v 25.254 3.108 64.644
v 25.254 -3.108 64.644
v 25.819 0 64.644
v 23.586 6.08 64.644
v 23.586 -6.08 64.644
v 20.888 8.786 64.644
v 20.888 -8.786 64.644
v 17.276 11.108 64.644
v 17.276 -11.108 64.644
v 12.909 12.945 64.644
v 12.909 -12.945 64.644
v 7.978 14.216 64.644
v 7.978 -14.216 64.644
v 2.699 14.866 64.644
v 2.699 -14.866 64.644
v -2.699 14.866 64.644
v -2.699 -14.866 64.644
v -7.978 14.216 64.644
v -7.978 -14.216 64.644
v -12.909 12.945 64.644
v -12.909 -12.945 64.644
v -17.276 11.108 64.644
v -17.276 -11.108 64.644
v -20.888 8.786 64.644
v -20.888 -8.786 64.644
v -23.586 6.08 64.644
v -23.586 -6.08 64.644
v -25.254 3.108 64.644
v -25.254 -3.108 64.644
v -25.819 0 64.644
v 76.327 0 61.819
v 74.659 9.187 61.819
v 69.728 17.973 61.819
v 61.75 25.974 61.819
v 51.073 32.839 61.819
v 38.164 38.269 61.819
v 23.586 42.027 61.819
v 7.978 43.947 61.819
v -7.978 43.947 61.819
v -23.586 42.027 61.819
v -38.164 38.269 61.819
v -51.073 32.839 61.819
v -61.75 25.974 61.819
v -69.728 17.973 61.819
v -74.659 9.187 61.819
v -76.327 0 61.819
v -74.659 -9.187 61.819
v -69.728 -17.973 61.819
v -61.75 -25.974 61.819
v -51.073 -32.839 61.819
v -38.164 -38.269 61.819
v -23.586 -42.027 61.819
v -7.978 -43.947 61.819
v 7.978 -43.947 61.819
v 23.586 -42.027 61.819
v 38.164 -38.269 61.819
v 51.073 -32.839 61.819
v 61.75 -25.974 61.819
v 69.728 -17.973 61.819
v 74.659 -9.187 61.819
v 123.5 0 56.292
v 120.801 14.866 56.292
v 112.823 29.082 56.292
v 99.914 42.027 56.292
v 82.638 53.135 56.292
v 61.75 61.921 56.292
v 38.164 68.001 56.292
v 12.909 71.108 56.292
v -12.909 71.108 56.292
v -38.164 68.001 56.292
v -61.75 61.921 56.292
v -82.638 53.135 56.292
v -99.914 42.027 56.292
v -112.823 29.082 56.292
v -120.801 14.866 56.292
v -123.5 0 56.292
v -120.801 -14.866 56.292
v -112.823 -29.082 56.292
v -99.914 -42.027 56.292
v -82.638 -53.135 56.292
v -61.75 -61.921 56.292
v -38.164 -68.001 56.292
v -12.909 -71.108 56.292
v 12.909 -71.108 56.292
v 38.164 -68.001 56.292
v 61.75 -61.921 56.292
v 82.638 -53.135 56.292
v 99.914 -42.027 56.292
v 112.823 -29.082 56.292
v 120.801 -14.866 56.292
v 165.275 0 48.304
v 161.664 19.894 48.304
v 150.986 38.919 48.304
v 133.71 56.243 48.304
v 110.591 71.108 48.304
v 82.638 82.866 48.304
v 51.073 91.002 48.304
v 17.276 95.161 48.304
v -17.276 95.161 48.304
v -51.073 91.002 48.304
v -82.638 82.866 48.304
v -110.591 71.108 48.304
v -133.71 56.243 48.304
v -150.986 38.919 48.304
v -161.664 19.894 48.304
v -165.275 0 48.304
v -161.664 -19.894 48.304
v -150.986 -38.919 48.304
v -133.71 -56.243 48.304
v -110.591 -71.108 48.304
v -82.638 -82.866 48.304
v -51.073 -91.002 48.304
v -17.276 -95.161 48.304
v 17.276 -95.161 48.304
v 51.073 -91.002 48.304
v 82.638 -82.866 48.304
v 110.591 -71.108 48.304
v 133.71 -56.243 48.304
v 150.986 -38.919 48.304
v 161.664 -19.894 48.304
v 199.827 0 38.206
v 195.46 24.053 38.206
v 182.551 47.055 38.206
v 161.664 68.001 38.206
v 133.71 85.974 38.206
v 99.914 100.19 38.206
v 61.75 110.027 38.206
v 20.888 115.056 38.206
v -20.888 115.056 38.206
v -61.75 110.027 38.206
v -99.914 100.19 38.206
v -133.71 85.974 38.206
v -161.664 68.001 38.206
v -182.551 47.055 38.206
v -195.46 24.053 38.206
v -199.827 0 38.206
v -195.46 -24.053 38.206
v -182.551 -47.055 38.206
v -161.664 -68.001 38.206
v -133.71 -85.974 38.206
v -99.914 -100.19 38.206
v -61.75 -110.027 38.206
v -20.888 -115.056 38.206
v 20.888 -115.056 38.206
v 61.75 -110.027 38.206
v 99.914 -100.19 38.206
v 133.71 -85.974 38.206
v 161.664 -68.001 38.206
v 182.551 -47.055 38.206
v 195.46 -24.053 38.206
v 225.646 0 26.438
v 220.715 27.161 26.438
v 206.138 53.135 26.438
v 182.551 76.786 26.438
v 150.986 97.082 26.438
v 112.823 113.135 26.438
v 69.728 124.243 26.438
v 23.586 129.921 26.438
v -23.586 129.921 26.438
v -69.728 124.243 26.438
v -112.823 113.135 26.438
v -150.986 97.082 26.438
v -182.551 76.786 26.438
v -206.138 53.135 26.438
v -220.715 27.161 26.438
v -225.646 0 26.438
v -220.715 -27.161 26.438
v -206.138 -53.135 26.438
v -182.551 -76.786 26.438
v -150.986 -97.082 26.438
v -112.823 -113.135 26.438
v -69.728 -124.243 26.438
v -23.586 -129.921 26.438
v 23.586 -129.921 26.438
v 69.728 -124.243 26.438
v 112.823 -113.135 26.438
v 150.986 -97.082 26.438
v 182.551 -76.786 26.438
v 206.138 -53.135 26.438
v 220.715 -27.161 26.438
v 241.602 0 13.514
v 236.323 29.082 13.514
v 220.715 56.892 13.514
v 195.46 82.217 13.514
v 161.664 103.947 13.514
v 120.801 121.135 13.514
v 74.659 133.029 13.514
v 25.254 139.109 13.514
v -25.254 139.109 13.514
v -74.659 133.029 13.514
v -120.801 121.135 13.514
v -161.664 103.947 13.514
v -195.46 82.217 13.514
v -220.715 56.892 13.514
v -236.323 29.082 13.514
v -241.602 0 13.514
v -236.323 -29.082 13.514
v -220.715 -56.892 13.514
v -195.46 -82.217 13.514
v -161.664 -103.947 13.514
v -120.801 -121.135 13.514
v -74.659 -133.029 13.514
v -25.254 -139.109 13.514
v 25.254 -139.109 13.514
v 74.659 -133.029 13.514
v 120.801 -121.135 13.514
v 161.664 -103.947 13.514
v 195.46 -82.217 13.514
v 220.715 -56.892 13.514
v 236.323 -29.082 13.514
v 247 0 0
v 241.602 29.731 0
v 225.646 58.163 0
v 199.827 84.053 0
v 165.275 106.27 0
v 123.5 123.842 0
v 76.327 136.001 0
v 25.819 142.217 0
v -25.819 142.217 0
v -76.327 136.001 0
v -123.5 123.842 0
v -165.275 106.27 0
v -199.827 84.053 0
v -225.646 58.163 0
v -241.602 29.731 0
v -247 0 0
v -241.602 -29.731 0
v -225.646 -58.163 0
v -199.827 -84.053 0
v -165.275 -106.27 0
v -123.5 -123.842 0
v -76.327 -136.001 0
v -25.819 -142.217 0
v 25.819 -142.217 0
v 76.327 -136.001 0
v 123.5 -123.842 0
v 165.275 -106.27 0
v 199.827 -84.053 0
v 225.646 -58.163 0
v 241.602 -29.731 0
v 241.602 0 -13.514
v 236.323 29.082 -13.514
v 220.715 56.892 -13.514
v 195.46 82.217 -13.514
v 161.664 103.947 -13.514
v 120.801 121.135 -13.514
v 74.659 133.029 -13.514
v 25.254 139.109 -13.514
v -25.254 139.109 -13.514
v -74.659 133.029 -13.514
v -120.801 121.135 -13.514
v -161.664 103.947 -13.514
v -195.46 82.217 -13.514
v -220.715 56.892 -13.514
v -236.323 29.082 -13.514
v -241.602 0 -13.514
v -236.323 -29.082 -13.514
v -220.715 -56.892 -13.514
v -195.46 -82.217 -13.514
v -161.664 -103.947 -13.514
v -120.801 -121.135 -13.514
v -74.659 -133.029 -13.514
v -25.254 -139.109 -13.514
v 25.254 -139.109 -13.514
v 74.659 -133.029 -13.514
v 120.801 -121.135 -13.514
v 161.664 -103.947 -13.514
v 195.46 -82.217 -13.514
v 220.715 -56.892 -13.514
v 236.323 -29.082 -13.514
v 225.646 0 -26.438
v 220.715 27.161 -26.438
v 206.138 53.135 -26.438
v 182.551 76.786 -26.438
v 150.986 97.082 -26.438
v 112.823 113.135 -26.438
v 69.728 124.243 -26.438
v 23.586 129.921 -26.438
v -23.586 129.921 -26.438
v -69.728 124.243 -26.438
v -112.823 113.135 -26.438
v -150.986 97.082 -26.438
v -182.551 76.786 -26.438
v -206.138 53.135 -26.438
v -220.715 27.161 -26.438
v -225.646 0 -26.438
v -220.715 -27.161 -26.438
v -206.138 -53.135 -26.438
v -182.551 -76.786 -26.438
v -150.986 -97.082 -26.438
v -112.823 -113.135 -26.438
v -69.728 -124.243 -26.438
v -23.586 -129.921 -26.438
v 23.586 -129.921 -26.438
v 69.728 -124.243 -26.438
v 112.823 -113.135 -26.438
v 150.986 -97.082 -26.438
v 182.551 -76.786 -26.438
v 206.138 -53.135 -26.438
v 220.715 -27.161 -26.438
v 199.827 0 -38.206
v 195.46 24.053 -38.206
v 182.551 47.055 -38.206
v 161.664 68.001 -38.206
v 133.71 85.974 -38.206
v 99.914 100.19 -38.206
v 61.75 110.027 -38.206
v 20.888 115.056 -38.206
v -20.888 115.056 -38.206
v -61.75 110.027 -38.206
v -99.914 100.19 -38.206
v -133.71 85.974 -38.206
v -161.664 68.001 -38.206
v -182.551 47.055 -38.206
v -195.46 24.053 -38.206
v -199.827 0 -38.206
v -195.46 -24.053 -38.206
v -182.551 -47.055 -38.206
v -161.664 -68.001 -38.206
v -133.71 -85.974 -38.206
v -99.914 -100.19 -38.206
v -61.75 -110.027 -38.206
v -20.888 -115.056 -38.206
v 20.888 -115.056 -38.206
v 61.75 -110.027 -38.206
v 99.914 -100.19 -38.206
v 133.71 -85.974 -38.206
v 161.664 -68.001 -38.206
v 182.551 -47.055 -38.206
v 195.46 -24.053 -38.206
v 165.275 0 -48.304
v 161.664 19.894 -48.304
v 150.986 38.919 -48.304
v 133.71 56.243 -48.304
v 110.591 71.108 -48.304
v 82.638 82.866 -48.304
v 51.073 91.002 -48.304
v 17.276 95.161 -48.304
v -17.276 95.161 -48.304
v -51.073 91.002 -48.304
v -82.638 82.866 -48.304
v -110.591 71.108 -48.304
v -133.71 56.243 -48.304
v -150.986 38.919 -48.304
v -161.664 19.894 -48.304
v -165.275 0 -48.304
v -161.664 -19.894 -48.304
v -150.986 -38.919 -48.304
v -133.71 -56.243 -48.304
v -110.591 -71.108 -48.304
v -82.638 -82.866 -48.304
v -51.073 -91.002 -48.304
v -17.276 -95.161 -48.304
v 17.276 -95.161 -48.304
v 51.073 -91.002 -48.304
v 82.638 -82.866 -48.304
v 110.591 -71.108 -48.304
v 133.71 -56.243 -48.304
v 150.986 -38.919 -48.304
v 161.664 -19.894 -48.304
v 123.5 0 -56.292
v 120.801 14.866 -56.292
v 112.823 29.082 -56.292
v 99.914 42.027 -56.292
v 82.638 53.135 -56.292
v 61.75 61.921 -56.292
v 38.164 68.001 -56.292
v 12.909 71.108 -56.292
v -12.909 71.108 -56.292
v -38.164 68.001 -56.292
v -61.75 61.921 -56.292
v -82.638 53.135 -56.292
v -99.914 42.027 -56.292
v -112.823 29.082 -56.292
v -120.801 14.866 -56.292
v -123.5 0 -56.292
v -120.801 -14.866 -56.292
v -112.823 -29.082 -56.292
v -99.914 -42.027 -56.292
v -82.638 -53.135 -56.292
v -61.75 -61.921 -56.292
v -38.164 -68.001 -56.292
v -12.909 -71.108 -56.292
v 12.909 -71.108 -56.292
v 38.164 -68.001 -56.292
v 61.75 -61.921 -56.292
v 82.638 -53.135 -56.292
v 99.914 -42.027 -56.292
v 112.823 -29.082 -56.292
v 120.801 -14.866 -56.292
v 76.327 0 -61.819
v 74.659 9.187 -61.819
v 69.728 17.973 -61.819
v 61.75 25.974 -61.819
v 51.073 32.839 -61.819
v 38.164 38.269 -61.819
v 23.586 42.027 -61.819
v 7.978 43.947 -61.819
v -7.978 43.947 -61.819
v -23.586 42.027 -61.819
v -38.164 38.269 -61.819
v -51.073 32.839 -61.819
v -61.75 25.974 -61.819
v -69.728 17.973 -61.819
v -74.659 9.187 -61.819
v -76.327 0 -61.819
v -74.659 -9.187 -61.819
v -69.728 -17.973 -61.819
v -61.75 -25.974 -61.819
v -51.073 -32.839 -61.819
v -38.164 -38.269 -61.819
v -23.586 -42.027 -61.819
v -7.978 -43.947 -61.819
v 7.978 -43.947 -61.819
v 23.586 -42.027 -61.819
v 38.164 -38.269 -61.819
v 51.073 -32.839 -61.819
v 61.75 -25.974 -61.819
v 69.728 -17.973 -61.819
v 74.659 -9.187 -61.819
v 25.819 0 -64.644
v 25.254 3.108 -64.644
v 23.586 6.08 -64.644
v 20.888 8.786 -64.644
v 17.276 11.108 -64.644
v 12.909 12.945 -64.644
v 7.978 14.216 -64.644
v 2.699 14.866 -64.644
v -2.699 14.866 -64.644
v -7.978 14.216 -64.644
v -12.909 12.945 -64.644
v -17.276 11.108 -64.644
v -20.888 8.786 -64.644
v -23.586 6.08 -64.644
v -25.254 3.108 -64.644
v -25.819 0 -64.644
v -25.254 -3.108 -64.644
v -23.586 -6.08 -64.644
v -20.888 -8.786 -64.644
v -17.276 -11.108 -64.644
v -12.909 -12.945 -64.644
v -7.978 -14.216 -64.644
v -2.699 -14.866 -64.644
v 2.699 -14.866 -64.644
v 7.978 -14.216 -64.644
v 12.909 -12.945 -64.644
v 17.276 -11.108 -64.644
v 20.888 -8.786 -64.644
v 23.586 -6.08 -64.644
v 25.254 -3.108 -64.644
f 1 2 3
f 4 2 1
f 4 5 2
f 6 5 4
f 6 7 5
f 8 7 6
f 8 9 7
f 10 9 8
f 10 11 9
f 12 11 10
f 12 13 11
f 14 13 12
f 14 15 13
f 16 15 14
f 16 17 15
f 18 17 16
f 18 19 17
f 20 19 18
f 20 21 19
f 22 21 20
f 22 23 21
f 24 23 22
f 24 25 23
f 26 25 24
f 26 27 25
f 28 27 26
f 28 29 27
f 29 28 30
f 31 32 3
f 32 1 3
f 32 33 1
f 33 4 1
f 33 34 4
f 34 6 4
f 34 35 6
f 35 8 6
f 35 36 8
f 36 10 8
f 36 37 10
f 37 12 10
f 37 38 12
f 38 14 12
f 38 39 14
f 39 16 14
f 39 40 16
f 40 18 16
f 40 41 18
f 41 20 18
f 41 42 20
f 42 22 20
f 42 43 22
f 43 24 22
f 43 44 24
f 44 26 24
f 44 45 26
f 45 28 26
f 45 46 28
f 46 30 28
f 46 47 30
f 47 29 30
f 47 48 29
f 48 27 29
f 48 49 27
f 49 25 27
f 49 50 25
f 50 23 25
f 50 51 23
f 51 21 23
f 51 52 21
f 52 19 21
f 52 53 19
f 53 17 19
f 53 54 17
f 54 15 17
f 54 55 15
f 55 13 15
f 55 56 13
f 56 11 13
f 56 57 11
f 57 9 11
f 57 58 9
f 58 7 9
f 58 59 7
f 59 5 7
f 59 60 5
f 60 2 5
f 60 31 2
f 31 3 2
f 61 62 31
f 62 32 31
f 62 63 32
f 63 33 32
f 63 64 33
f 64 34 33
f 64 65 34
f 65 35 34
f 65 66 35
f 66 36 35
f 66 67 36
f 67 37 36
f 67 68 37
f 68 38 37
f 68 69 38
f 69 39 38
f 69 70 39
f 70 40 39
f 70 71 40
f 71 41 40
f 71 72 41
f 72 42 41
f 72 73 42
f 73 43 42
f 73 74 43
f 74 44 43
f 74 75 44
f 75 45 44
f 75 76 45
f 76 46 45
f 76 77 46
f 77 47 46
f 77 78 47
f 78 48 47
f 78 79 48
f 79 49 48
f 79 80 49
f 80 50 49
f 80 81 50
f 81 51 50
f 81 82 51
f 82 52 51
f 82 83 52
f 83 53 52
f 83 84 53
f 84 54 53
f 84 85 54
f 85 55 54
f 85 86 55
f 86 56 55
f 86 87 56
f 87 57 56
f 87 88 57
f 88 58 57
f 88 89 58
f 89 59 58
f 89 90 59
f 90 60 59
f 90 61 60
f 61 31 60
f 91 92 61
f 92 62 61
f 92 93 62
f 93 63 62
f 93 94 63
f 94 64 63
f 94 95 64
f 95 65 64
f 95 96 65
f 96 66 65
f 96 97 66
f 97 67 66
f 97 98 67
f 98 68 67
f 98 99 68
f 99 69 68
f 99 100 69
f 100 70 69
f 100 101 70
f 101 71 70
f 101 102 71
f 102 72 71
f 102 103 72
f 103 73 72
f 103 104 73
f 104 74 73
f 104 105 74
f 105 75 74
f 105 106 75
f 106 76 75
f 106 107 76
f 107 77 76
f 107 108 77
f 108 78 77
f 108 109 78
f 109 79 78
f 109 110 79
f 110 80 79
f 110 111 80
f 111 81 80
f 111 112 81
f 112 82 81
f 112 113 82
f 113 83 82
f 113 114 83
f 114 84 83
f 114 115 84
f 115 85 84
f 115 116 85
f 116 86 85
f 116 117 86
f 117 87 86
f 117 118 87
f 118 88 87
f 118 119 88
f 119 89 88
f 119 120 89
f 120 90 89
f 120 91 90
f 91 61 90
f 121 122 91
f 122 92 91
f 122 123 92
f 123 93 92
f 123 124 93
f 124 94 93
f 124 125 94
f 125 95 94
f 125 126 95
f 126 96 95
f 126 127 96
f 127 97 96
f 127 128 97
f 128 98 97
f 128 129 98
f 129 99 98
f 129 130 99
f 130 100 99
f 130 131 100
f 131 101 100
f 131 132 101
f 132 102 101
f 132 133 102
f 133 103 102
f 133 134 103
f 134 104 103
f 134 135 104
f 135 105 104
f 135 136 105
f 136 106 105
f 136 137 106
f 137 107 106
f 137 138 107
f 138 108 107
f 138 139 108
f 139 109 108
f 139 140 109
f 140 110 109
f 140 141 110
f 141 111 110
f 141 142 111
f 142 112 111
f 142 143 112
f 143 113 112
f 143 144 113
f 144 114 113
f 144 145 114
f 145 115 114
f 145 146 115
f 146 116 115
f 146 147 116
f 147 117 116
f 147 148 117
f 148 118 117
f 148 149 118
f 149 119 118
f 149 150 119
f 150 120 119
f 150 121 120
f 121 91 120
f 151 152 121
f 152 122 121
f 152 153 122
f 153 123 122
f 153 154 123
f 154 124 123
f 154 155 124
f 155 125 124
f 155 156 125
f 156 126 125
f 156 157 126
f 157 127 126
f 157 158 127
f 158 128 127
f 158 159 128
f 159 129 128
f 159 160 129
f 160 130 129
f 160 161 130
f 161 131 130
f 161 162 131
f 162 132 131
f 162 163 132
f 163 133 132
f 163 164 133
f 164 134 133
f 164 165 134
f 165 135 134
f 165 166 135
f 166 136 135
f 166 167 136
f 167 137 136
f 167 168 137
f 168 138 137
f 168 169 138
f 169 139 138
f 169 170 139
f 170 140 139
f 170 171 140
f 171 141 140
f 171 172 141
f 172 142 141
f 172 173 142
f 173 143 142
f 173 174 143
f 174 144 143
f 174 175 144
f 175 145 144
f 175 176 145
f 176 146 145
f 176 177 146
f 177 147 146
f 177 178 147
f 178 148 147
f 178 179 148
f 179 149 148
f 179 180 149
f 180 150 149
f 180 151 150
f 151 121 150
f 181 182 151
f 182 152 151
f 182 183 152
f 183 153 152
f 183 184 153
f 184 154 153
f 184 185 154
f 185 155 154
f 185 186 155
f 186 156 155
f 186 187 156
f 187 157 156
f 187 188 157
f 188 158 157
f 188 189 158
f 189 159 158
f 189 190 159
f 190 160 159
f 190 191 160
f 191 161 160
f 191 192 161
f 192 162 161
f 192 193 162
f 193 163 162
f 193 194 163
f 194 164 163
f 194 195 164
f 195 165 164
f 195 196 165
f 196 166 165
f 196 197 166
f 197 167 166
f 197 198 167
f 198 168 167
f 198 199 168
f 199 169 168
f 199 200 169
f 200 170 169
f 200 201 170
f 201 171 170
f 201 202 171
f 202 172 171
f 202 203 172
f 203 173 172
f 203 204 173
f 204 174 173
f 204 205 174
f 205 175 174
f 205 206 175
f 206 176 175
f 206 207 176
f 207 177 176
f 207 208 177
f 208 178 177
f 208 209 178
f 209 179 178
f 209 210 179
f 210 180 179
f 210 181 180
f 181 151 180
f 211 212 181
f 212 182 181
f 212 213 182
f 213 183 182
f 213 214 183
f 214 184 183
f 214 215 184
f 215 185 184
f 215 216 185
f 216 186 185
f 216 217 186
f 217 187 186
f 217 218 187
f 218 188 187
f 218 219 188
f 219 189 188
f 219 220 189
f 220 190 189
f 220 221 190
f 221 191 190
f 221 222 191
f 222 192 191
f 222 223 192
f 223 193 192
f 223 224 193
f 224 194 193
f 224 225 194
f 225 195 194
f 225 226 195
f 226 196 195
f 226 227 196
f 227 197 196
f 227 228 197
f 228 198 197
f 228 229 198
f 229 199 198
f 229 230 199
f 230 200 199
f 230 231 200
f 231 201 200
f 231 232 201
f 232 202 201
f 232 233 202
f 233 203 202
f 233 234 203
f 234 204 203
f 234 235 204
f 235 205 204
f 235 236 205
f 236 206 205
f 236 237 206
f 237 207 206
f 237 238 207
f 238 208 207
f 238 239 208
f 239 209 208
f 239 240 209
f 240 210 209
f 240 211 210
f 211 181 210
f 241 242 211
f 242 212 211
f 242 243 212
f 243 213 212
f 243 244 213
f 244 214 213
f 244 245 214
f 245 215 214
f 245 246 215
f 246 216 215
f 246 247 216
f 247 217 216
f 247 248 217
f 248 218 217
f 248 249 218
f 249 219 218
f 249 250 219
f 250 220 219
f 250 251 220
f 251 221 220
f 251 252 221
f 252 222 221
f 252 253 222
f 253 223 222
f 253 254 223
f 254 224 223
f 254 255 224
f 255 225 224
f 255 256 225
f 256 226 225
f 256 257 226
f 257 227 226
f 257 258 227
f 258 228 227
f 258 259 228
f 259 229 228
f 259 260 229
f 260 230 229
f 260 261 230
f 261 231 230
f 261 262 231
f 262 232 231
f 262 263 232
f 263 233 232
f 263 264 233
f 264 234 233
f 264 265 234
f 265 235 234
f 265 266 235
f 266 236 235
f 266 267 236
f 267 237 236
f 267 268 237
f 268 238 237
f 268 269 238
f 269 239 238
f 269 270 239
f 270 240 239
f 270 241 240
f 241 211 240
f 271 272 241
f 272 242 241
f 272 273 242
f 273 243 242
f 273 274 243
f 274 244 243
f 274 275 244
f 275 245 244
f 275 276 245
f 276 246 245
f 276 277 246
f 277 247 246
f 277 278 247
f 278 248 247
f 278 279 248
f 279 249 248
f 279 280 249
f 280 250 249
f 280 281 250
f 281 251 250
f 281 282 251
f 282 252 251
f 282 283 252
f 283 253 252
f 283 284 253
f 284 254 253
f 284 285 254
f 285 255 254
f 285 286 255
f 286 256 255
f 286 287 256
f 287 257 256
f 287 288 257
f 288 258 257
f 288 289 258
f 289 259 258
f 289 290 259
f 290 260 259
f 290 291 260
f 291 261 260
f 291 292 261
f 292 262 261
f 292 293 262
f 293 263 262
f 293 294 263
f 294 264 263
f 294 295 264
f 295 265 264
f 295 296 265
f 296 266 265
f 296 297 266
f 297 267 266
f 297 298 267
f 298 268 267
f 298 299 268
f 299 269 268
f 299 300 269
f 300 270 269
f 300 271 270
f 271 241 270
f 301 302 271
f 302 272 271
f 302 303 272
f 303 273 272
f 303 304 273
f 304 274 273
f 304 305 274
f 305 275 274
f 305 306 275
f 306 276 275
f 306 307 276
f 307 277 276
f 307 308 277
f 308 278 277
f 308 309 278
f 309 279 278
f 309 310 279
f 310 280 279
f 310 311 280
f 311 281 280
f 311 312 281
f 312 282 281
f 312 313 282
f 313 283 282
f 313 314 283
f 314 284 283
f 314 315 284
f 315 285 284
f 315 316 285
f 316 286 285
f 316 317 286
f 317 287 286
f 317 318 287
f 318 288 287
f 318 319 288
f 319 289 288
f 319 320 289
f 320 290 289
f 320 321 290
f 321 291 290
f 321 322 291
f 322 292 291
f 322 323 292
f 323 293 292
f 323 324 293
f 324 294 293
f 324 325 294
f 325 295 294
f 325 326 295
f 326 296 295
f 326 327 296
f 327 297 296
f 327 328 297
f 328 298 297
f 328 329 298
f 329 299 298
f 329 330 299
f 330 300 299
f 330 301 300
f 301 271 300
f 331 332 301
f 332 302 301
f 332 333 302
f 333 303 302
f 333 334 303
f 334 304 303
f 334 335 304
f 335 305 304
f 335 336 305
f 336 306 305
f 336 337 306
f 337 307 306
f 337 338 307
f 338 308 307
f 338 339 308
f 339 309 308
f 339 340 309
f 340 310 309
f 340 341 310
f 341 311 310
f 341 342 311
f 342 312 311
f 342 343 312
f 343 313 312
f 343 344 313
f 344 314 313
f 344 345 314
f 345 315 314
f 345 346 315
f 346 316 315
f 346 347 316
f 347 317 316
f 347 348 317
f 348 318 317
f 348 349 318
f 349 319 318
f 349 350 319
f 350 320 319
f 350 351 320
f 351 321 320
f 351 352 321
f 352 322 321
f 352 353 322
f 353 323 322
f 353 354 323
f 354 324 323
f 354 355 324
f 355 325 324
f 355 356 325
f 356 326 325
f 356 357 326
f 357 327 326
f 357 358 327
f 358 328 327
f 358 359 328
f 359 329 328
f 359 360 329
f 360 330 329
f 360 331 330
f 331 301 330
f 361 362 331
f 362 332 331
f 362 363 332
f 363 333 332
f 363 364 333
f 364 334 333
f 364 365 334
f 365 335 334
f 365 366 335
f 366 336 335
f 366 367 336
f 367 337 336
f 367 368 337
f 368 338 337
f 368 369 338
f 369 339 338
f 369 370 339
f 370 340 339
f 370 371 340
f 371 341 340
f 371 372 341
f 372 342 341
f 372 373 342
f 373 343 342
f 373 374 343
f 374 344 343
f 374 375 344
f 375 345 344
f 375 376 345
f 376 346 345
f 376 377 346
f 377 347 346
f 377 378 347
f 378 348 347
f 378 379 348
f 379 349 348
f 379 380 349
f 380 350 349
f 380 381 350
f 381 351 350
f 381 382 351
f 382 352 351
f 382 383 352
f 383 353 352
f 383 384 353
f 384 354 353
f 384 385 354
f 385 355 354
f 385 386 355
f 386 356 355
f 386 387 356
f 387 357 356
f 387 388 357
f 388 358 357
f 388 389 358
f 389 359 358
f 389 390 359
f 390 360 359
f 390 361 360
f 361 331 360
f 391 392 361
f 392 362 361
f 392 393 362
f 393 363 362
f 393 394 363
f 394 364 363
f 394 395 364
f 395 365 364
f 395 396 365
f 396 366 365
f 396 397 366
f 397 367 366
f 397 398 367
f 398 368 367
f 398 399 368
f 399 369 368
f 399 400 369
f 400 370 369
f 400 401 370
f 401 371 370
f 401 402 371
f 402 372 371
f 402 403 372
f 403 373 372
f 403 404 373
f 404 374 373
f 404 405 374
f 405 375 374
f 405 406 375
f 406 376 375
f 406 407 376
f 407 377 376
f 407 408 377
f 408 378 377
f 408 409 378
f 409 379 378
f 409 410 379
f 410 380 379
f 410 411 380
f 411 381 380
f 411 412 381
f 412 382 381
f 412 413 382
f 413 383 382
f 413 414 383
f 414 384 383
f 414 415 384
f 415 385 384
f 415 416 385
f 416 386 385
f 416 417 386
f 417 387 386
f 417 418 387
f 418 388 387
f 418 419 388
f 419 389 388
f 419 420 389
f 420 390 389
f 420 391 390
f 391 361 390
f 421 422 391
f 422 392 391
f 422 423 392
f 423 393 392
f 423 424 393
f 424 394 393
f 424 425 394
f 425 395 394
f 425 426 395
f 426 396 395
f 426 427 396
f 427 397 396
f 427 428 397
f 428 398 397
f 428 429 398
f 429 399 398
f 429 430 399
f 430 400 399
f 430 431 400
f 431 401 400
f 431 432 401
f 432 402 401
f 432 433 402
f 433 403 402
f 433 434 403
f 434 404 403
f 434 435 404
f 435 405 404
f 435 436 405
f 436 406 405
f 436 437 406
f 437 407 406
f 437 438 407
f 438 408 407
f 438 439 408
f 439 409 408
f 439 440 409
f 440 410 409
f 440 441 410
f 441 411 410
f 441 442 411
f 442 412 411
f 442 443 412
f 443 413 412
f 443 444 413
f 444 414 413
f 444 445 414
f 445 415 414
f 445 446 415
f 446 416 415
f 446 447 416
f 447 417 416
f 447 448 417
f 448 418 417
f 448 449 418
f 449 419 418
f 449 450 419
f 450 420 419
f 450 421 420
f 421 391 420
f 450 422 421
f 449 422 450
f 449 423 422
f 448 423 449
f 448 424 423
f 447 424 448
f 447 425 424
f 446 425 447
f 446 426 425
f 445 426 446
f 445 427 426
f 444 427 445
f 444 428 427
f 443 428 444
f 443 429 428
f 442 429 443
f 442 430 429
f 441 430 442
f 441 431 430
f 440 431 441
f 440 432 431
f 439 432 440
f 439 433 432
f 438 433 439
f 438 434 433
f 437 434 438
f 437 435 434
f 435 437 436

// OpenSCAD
// Generated by SolidPython 1.0.1 on 2020-07-29 00:46:54


scale(v = [19, 11, 5]) {
	sphere(r = 13);
}
/***********************************************
*********      SolidPython code:      **********
************************************************
 
# import packages: SolidPython
from solid import *
from solid.utils import *
from itertools import chain, combinations, permutations


class Resize:

    def __init__(self, scad_file):
        self.scad_file = scad_file
        #self.scad_file = import_scad(scad_file)
        # cone/cylinder param:
        self.r1 = 0
        self.r2 = 0
        self.h = 0
        # rectangular prism param:
        self.w = 0
        self.l = 0
        # ellipse param:
        self.r = 0

    # import OpenScad code (file name corresponds to shape)


    # classify shape + parameters
    def assign(self, param1, param2, param3):
        if self.scad_file == 'cone.scad':
            self.r1 = param1
            self.r2 = param2
            self.h = param3
        elif self.scad_file == 'cylinder.scad':
            self.r1 = param1
            self.r2 = param2
            self.h = param3
        elif self.scad_file == 'rectangularPrism.scad':
            self.h = param1
            self.l = param2
            self.w = param3
        else:
            self.r = param1
            self.h = param2

    # resize parameters
    def iterate(self):
        x = range(3, 20, 2)
        i = 1
        if self.scad_file == 'cone.scad':
            tempList = list(permutations(x, 2))
            for temp in tempList:
                param1 = temp[0]
                param2 = temp[1]
                filepath = 'produced_scad_files/' + 'cone' + str(param1) + '_' + str(param2) + '_' + '.scad'
                scad_render_to_file(cylinder(h=param1, r1=param2, r2=0), filepath)

        elif self.scad_file == 'cylinder.scad':
            tempList = list(permutations(x, 3))
            for temp in tempList:
                param1 = temp[0]
                param2 = temp[1]
                filepath = 'produced_scad_files/' + 'cylinder' + str(param1) + '_' + str(param2) + '_' + '.scad'
                scad_render_to_file(cylinder(h=param1, r1=param2, r2=param2), filepath)

        elif self.scad_file == 'rectangularPrism.scad':
            tempList = list(permutations(x, 3))
            for temp in tempList:
                param1 = temp[0]
                param2 = temp[1]
                param3 = temp[2]
                filepath = 'produced_scad_files/' + 'rectangularPrism' + str(param1) + '_' + str(param2) + '_' + str(
                    param3) + '.scad'
                scad_render_to_file(cube(size=(param1, param2, param3)), filepath)

        elif self.scad_file == 'ellipse.scad':
            tempList = list(permutations(x, 4))
            for temp in tempList:
                param1 = temp[0]
                param2 = temp[1]
                param3 = temp[2]
                param4 = temp[3]
                filepath = 'produced_scad_files/' + 'ellipse' + str(param1) + '_' + str(param2) + '_' + str(param3) + '_' + str(param4) + '.scad'
                scad_render_to_file(scale([param1, param2, param3])(sphere(r=param4)), filepath)

    def render_to_scadfile(self):
        scad_render_to_file(scad, 'example.scad') 
 
************************************************/
